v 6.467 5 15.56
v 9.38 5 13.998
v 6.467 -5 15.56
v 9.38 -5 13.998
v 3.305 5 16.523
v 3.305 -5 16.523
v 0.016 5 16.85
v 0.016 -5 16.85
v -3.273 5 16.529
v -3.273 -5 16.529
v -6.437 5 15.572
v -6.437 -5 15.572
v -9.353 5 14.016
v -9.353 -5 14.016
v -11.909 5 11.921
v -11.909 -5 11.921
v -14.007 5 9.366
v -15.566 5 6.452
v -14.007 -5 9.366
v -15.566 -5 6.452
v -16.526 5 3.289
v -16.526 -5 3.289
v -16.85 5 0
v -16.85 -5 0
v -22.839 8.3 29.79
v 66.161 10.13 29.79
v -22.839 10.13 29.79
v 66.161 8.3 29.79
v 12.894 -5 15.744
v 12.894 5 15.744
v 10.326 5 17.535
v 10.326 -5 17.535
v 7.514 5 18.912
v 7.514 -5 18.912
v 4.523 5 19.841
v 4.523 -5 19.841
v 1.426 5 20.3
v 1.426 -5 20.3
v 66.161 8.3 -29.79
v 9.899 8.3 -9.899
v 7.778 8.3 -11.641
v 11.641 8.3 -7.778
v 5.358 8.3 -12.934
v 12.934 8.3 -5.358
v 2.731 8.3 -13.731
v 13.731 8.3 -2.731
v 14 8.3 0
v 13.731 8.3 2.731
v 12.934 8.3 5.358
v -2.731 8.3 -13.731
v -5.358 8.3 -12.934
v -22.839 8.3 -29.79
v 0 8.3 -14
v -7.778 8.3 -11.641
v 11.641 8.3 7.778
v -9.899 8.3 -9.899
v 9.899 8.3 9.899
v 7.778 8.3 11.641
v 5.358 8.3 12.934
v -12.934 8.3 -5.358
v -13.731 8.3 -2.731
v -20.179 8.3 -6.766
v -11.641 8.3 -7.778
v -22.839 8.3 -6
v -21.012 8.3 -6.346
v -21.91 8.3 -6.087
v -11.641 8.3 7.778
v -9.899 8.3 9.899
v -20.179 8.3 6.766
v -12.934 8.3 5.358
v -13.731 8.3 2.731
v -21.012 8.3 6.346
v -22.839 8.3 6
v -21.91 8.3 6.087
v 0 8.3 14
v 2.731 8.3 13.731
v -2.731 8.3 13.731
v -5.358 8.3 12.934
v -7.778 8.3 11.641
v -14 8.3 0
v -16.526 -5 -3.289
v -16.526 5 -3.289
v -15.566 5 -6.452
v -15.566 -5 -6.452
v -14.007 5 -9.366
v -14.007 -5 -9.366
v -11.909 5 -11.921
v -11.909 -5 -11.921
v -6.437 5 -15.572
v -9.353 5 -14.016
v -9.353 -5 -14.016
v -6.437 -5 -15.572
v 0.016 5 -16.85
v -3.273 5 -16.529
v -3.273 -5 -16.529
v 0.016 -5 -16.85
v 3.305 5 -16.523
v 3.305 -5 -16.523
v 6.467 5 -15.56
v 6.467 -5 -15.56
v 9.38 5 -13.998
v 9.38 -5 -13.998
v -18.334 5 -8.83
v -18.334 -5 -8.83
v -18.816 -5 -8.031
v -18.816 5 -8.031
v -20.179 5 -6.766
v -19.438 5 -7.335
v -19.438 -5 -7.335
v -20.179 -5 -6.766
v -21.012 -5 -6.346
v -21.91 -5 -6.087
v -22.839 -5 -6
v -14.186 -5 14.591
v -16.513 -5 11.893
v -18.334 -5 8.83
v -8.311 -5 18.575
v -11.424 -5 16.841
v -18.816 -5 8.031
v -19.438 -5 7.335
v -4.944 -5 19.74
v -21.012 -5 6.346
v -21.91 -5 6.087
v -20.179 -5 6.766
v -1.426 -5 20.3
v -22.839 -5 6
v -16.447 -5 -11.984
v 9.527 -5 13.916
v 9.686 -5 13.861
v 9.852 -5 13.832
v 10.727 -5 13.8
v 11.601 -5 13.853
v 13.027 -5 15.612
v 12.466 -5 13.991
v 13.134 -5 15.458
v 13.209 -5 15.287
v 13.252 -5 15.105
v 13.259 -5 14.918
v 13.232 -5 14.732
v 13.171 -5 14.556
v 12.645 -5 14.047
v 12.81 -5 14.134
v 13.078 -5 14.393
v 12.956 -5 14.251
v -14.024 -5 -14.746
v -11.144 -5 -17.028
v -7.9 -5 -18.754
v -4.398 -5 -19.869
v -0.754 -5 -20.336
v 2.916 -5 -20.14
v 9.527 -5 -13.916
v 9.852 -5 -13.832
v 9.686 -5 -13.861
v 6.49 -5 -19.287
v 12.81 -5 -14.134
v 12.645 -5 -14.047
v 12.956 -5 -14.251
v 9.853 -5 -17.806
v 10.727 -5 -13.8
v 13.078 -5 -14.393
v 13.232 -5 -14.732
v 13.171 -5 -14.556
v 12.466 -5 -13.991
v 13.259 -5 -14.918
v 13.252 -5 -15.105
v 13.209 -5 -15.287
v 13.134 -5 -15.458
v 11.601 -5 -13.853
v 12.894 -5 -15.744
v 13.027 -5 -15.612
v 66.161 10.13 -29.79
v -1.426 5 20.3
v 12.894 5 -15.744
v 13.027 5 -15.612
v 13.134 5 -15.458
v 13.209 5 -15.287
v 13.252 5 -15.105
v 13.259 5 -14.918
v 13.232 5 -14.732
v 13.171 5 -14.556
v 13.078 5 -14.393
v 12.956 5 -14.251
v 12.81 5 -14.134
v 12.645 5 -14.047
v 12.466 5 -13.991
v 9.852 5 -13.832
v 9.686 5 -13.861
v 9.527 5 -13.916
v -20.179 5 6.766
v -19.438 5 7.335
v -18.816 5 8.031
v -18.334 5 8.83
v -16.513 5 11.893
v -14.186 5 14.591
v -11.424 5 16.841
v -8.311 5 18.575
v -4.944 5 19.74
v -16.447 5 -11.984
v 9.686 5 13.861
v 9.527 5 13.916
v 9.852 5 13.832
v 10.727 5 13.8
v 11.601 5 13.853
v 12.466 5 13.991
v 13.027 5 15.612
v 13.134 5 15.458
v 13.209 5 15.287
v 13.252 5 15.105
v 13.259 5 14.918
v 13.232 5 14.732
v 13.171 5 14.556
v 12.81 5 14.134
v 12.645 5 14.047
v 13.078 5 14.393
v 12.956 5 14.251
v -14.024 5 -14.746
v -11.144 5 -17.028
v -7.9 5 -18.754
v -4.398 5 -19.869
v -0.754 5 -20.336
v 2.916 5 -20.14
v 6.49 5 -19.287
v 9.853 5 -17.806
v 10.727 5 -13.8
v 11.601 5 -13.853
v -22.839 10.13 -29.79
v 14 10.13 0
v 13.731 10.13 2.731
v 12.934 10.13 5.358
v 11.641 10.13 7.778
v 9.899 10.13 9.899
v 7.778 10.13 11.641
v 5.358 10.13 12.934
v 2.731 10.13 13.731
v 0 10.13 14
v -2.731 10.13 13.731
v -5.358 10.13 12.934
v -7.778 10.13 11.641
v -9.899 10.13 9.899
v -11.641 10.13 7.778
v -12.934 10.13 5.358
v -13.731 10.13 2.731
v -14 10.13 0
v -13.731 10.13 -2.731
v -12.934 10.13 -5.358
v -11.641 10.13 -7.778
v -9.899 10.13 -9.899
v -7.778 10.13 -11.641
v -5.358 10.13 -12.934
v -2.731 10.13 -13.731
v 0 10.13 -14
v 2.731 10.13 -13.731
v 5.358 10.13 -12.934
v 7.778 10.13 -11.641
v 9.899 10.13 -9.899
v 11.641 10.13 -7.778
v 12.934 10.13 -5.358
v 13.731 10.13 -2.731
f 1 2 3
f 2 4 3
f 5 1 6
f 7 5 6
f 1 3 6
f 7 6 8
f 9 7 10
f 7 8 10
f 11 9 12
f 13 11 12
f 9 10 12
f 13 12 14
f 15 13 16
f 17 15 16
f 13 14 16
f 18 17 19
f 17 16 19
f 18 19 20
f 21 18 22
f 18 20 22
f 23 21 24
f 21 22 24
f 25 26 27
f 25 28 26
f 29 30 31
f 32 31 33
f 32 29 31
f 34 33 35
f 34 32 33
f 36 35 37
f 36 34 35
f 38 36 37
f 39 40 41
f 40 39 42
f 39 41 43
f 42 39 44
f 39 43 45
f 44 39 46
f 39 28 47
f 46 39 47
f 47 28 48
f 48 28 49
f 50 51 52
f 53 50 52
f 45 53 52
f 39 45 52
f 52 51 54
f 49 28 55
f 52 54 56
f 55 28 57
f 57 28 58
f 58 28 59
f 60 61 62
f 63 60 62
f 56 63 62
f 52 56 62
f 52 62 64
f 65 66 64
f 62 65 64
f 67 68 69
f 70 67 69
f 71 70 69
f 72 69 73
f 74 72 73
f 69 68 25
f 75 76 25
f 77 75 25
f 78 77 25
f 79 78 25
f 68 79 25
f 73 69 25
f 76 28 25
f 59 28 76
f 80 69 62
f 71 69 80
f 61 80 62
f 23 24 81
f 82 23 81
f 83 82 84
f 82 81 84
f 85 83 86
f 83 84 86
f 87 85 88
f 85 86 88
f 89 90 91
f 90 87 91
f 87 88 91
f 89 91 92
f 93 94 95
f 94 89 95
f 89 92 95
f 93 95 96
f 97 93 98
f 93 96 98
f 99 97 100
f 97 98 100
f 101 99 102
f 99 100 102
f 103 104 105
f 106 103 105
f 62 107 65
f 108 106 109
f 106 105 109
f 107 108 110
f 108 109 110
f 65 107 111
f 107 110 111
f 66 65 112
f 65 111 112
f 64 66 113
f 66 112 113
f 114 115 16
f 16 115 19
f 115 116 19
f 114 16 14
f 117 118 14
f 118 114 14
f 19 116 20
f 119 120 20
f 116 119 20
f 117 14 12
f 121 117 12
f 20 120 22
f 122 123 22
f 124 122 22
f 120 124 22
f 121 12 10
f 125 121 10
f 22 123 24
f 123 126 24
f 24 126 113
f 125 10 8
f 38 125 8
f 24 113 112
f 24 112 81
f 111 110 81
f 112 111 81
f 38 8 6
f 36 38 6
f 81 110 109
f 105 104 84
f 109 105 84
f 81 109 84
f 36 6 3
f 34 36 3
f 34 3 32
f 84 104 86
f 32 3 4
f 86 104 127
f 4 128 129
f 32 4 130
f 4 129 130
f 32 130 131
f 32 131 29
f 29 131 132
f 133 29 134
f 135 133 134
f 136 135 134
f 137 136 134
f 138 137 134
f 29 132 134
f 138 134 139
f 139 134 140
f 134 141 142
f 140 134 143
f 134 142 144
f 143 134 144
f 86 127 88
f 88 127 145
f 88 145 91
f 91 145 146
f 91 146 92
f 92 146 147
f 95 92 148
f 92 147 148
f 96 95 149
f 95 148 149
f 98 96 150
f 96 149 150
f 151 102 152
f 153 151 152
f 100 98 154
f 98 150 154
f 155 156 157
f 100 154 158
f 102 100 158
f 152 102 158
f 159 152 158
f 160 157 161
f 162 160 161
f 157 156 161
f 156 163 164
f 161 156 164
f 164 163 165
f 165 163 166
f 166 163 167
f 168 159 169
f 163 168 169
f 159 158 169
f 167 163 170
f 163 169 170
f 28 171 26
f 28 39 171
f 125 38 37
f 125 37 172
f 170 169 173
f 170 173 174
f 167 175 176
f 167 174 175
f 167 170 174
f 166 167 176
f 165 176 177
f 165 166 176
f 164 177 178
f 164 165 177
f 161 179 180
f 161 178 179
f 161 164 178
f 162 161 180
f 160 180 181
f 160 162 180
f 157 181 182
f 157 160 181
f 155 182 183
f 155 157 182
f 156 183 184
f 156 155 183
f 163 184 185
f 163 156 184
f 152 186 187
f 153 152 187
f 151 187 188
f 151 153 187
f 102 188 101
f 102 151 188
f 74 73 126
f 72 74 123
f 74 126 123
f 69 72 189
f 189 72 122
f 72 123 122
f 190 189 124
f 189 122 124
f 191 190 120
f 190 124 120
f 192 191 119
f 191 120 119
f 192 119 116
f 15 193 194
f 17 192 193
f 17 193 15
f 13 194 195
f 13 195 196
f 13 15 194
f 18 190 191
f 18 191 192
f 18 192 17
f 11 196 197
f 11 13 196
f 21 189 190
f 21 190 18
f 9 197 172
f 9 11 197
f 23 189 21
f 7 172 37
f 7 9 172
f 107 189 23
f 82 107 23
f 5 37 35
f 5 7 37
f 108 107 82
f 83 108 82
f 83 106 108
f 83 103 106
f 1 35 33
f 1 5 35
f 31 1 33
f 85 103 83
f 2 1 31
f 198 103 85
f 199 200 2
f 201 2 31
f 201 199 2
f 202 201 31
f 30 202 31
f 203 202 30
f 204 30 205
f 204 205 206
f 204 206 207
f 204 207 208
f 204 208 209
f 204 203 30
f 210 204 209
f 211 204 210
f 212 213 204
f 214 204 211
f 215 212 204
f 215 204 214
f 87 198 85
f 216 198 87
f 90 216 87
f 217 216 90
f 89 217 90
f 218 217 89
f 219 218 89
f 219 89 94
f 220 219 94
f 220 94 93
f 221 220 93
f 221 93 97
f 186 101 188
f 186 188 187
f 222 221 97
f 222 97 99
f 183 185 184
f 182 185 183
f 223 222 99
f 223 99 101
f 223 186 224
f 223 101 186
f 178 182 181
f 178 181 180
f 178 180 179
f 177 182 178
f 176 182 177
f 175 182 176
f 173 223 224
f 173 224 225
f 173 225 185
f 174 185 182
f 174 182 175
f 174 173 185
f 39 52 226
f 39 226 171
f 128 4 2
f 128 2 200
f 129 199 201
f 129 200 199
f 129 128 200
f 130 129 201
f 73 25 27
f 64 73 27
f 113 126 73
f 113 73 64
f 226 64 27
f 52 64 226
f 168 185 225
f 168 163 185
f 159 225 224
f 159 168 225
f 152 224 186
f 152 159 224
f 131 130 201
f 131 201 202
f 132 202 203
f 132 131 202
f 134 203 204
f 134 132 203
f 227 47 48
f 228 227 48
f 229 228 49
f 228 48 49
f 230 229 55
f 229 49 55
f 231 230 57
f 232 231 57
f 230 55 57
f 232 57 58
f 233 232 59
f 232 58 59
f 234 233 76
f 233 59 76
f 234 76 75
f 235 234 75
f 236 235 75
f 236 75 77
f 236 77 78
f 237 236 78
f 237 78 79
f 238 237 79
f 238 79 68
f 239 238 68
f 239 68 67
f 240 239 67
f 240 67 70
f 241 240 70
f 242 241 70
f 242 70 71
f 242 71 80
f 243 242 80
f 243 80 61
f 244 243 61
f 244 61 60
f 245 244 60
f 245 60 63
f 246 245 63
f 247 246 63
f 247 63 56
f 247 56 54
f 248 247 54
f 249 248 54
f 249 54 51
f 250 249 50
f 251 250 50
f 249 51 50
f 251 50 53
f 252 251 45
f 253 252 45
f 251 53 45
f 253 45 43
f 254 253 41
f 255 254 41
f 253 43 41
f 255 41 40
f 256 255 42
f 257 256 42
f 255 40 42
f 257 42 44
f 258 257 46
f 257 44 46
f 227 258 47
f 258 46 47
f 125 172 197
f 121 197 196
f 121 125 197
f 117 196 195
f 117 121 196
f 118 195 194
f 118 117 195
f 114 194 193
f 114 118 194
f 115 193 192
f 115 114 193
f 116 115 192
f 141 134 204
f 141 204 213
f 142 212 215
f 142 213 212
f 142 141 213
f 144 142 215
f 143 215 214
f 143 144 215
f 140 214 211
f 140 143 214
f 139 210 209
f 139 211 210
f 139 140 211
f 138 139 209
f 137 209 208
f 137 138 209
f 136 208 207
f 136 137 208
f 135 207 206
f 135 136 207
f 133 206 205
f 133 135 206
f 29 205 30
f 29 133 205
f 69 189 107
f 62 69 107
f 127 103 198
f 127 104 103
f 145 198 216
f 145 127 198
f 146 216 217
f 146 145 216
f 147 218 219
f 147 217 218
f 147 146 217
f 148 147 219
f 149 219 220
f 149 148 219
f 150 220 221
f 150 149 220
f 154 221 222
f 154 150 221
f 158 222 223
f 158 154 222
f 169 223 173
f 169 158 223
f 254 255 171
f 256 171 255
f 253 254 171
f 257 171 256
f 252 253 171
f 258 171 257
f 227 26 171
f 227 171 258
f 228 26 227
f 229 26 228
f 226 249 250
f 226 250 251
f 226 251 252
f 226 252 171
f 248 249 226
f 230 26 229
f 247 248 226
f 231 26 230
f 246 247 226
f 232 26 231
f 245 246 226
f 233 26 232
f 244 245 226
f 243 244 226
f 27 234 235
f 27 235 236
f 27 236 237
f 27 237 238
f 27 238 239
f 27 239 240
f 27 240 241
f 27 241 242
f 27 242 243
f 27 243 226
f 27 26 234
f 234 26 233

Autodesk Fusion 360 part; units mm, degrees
sketch "Sketch1" plane through (0, 0, 0) normal (0, 1, 0) x (1, 0, 0)
  line L0 (-39.5, 0) -> (-39.5, 6)
  line L1 (-39.5, 6) -> (-22.8391, 6)
  line L2 (-50, 0) -> (42, 0) construction
  line L3 (0, 0) -> (18.7964, 26.8441) construction
  arc A0 (9.38, 13.9978) -> (-16.85, 0) centre (0, 0) ccw
  arc A1 (12.8944, 15.7435) -> (-18.3343, 8.8304) centre (0, 0) ccw
  arc A2 (-22.8391, 6) -> (-18.3343, 8.8304) centre (-22.8391, 11) ccw
  line L4 (-28.5277, 8) -> (-28.5277, 0)
  line L5 (-39.5, -6) -> (-22.8391, -6)
  arc A3 (-18.3343, -8.8304) -> (-22.8391, -6) centre (-22.8391, -11) ccw
  line L6 (-28.5277, -8) -> (-28.5277, 0)
  arc A4 (-16.85, 0) -> (9.38, -13.9978) centre (0, 0) ccw
  line L7 (-39.5, 0) -> (-39.5, -6)
  arc A5 (9.8515, 13.8322) -> (12.4661, 13.9912) centre (10.6183, 22.7994) ccw
  line L8 (0, 28) -> (0, 20.2823) construction
  line L9 (0, 20.35) -> (0, -24) construction
  arc A6 (12.4661, 13.9912) -> (12.8944, 15.7435) centre (12.2608, 14.9699) ccw
  arc A7 (9.38, 13.9978) -> (9.8515, 13.8322) centre (9.9367, 14.8285) ccw
  arc A8 (12.8944, -15.7435) -> (12.4661, -13.9912) centre (12.2608, -14.9699) ccw
  arc A9 (12.4661, -13.9912) -> (9.8515, -13.8322) centre (10.6183, -22.7994) ccw
  arc A10 (9.8515, -13.8322) -> (9.38, -13.9978) centre (9.9367, -14.8285) ccw
  line L10 (-0.661, 0) -> (-0.661, -36.4532) construction
  line L11 (3.815, 0) -> (3.815, -36.4532) construction
  line L12 (-0.661, -36.4532) -> (3.815, -36.4532) construction
  line L13 (-0.073, -19.5) -> (-0.073, -20.3)
  line L14 (-0.073, -20.3) -> (3.227, -20.3)
  line L15 (3.227, -19.5) -> (3.227, -20.3)
  arc A11 (3.227, -19.5) -> (-0.073, -19.5) centre (1.577, -19.5) ccw
  line L16 (-0.073, -20.3) -> (-13.423, -20.3)
  line L17 (-13.423, -20.3) -> (-13.423, -30.3)
  line L18 (-13.423, -30.3) -> (-16.923, -30.3)
  line L19 (-5.423, -20.3) -> (-5.423, -11) construction
  arc A12 (-18.3343, -8.8304) -> (-1.4257, -20.3) centre (0, 0) ccw
  arc A13 (1.4257, -20.3) -> (12.8944, -15.7435) centre (0, 0) ccw
  line L20 (-0.073, -22.3) -> (-11.423, -22.3)
  line L21 (-11.423, -22.3) -> (-11.423, -30.3)
  line L22 (-11.423, -30.3) -> (-13.423, -30.3)
  line L23 (-0.073, -22.3) -> (-0.073, -20.3)
  line L24 (-0.073, -20.3) -> (-0.073, -16.8498)
  line L25 (3.227, -20.3) -> (3.227, -16.5381)
  line L26 (-16.923, -30.3) -> (-16.923, -11.302)
  line L27 (-22.8391, -6) -> (-22.8391, 6)
  line L28 (-20.179, -6.7663) -> (-20.179, 6.7663)
  point P0 (-50, 0)
  dimension "d1" = 33.7
  dimension "d4" = 6
  dimension "d5" = 39.5
  dimension "d6" = 3.5
  dimension "d7" = 5
  dimension "d11" = 55
  dimension "d30" = 1
  dimension "d31" = 9
  dimension "d32" = 1
  dimension "d36" = 3.815
  dimension "d37" = 3.3
  dimension "d39" = 0.661
  dimension "d40" = 4.476
  dimension "d41" = 2.238
  dimension "d42" = 0.8
  dimension "d43" = 19.5
  dimension "d44" = 15
  dimension "d45" = 7
  dimension "d46" = 10
  dimension "d47" = 3.5
  dimension "d48" = -2
  dimension "d70" = 28.5277
extrude "Extrude1" add sketch "Sketch1" along normal mid plane 10 contours A2 A3 L27 L28 | A0 A1 A2 A3 A4 A5 A6 A7 L13 L16 A12 L24 L28 | L13 L14 L15 A11 A13 L24 L25 | A4 A11 L24 L25 | A4 A8 A9 A10 L15 A13 L25
ref_plane "WorkPlane1" through (-16.85, 0, 0) normal (1, 0, 0) x (0, 1, 0)
sketch "Sketch2" plane through (-16.85, 0, 0) normal (1, 0, 0) x (0, 0, -1)
  line L0 (-1.6743, 2.9) -> (-3.3486, 0)
  line L1 (-3.3486, 0) -> (-1.6743, -2.9)
  line L2 (-1.6743, -2.9) -> (1.6743, -2.9)
  line L3 (1.6743, -2.9) -> (3.3486, 0)
  line L4 (3.3486, 0) -> (1.6743, 2.9)
  line L5 (1.6743, 2.9) -> (-1.6743, 2.9)
  circle A0 centre (0, 0) radius 1.6
  line L6 (-1.175, 2.175) -> (1.175, 2.175)
  line L7 (2.175, 1.175) -> (2.175, -1.175)
  line L8 (1.175, -2.175) -> (-1.175, -2.175)
  line L9 (-2.175, -1.175) -> (-2.175, 1.175)
  line L10 (-2.175, 2.175) -> (2.175, -2.175) construction
  line L11 (2.175, 2.175) -> (-2.175, -2.175) construction
  arc A1 (-1.175, 2.175) -> (-2.175, 1.175) centre (-1.175, 1.175) ccw
  arc A2 (-2.175, -1.175) -> (-1.175, -2.175) centre (-1.175, -1.175) ccw
  arc A3 (1.175, -2.175) -> (2.175, -1.175) centre (1.175, -1.175) ccw
  arc A4 (2.175, 1.175) -> (1.175, 2.175) centre (1.175, 1.175) ccw
  circle A5 centre (0, 2.175) radius 2.25
  dimension "d16" = 2.9
  dimension "d104" = 4.35
  dimension "d105" = 4.35
  dimension "d106" = 1
  dimension "d125" = 4.5
ref_plane "WorkPlane2" through (0, 4.9, 0) normal (0, 1, 0) x (0, 0, 1)
extrude "Extrude19" add sketch "Sketch1" along normal blind 8.3 contours A2 A3 L27 L28
sketch "Sketch11" plane through (0, 8.3, 0) normal (0, 1, 0) x (-1, 0, 0)
  arc A0 (20.179, 6.7663) -> (22.8391, 6) centre (22.8391, 11) ccw
  line L0 (20.179, 6.7663) -> (20.179, -6.7663)
  arc A1 (22.8391, -6) -> (20.179, -6.7663) centre (22.8391, -11) ccw
  line L1 (22.8391, -6) -> (22.8391, 6)
  line L2 (22.8391, -29.79) -> (-66.1609, -29.79)
  line L3 (-66.1609, -29.79) -> (-66.1609, 29.79)
  line L4 (-66.1609, 29.79) -> (22.8391, 29.79)
  line L5 (22.8391, 29.79) -> (22.8391, -29.79)
  line L6 (22.8391, 6) -> (22.8391, -6)
  point P0 (22.8391, -6)
  dimension "d116" = 89
  dimension "d117" = 59.58
  dimension "d118" = 29.79
extrude "Extrude20" add sketch "Sketch11" along normal blind 1.83
sketch "Sketch12" plane through (0, -5, 0) normal (0, -1, 0) x (1, 0, 0)
  arc A0 (-1.4257, 20.3) -> (-18.3343, 8.8304) centre (0, 0) ccw
  arc A1 (-22.8391, 6) -> (-18.3343, 8.8304) centre (-22.8391, 11) ccw
  line L0 (-22.8391, 6) -> (-22.8391, -6)
  arc A2 (-18.3343, -8.8304) -> (-22.8391, -6) centre (-22.8391, -11) ccw
  arc A3 (-18.3343, -8.8304) -> (12.8944, -15.7435) centre (0, 0) ccw
  arc A4 (12.8944, -15.7435) -> (12.4661, -13.9912) centre (12.2608, -14.9699) ccw
  arc A5 (12.4661, -13.9912) -> (9.8515, -13.8322) centre (10.6183, -22.7994) ccw
  arc A6 (9.8515, -13.8322) -> (9.38, -13.9978) centre (9.9367, -14.8285) ccw
  arc A7 (9.38, 13.9978) -> (9.38, -13.9978) centre (0, 0) ccw
  arc A8 (9.38, 13.9978) -> (9.8515, 13.8322) centre (9.9367, 14.8285) ccw
  arc A9 (9.8515, 13.8322) -> (12.4661, 13.9912) centre (10.6183, 22.7994) ccw
  arc A10 (12.4661, 13.9912) -> (12.8944, 15.7435) centre (12.2608, 14.9699) ccw
  arc A11 (12.8944, 15.7435) -> (1.4257, 20.3) centre (0, 0) ccw
  line L1 (1.4257, 20.3) -> (-1.4257, 20.3)
  arc A12 (-16.85, 0) -> (9.38, -13.9978) centre (0, 0) ccw
  arc A13 (9.38, 13.9978) -> (-16.85, 0) centre (0, 0) ccw
  circle A14 centre (0, 0) radius 14
  dimension "d128" = 28
extrude "Extrude22" cut sketch "Sketch12" against normal up to surface (15.13 mm away) contours A14
equation "d5 = 50 mm - 10.5 mm"
equation "d41 = ( 4.476 / 2 ) * 1 mm"
equation "d43 = d1 / 2 + 1 mm + d37 / 2"
equation "d114 = 7.4 mm + 0.9 mm"
equation "d118 = d117 / 2"
equation "d120 = 2.23 mm - 0.4 mm"
equation "d119 = ( 30 / 2 ) * 1 mm + 7 mm"
equation "d95 = 0.5 mm + 0.8 mm"
